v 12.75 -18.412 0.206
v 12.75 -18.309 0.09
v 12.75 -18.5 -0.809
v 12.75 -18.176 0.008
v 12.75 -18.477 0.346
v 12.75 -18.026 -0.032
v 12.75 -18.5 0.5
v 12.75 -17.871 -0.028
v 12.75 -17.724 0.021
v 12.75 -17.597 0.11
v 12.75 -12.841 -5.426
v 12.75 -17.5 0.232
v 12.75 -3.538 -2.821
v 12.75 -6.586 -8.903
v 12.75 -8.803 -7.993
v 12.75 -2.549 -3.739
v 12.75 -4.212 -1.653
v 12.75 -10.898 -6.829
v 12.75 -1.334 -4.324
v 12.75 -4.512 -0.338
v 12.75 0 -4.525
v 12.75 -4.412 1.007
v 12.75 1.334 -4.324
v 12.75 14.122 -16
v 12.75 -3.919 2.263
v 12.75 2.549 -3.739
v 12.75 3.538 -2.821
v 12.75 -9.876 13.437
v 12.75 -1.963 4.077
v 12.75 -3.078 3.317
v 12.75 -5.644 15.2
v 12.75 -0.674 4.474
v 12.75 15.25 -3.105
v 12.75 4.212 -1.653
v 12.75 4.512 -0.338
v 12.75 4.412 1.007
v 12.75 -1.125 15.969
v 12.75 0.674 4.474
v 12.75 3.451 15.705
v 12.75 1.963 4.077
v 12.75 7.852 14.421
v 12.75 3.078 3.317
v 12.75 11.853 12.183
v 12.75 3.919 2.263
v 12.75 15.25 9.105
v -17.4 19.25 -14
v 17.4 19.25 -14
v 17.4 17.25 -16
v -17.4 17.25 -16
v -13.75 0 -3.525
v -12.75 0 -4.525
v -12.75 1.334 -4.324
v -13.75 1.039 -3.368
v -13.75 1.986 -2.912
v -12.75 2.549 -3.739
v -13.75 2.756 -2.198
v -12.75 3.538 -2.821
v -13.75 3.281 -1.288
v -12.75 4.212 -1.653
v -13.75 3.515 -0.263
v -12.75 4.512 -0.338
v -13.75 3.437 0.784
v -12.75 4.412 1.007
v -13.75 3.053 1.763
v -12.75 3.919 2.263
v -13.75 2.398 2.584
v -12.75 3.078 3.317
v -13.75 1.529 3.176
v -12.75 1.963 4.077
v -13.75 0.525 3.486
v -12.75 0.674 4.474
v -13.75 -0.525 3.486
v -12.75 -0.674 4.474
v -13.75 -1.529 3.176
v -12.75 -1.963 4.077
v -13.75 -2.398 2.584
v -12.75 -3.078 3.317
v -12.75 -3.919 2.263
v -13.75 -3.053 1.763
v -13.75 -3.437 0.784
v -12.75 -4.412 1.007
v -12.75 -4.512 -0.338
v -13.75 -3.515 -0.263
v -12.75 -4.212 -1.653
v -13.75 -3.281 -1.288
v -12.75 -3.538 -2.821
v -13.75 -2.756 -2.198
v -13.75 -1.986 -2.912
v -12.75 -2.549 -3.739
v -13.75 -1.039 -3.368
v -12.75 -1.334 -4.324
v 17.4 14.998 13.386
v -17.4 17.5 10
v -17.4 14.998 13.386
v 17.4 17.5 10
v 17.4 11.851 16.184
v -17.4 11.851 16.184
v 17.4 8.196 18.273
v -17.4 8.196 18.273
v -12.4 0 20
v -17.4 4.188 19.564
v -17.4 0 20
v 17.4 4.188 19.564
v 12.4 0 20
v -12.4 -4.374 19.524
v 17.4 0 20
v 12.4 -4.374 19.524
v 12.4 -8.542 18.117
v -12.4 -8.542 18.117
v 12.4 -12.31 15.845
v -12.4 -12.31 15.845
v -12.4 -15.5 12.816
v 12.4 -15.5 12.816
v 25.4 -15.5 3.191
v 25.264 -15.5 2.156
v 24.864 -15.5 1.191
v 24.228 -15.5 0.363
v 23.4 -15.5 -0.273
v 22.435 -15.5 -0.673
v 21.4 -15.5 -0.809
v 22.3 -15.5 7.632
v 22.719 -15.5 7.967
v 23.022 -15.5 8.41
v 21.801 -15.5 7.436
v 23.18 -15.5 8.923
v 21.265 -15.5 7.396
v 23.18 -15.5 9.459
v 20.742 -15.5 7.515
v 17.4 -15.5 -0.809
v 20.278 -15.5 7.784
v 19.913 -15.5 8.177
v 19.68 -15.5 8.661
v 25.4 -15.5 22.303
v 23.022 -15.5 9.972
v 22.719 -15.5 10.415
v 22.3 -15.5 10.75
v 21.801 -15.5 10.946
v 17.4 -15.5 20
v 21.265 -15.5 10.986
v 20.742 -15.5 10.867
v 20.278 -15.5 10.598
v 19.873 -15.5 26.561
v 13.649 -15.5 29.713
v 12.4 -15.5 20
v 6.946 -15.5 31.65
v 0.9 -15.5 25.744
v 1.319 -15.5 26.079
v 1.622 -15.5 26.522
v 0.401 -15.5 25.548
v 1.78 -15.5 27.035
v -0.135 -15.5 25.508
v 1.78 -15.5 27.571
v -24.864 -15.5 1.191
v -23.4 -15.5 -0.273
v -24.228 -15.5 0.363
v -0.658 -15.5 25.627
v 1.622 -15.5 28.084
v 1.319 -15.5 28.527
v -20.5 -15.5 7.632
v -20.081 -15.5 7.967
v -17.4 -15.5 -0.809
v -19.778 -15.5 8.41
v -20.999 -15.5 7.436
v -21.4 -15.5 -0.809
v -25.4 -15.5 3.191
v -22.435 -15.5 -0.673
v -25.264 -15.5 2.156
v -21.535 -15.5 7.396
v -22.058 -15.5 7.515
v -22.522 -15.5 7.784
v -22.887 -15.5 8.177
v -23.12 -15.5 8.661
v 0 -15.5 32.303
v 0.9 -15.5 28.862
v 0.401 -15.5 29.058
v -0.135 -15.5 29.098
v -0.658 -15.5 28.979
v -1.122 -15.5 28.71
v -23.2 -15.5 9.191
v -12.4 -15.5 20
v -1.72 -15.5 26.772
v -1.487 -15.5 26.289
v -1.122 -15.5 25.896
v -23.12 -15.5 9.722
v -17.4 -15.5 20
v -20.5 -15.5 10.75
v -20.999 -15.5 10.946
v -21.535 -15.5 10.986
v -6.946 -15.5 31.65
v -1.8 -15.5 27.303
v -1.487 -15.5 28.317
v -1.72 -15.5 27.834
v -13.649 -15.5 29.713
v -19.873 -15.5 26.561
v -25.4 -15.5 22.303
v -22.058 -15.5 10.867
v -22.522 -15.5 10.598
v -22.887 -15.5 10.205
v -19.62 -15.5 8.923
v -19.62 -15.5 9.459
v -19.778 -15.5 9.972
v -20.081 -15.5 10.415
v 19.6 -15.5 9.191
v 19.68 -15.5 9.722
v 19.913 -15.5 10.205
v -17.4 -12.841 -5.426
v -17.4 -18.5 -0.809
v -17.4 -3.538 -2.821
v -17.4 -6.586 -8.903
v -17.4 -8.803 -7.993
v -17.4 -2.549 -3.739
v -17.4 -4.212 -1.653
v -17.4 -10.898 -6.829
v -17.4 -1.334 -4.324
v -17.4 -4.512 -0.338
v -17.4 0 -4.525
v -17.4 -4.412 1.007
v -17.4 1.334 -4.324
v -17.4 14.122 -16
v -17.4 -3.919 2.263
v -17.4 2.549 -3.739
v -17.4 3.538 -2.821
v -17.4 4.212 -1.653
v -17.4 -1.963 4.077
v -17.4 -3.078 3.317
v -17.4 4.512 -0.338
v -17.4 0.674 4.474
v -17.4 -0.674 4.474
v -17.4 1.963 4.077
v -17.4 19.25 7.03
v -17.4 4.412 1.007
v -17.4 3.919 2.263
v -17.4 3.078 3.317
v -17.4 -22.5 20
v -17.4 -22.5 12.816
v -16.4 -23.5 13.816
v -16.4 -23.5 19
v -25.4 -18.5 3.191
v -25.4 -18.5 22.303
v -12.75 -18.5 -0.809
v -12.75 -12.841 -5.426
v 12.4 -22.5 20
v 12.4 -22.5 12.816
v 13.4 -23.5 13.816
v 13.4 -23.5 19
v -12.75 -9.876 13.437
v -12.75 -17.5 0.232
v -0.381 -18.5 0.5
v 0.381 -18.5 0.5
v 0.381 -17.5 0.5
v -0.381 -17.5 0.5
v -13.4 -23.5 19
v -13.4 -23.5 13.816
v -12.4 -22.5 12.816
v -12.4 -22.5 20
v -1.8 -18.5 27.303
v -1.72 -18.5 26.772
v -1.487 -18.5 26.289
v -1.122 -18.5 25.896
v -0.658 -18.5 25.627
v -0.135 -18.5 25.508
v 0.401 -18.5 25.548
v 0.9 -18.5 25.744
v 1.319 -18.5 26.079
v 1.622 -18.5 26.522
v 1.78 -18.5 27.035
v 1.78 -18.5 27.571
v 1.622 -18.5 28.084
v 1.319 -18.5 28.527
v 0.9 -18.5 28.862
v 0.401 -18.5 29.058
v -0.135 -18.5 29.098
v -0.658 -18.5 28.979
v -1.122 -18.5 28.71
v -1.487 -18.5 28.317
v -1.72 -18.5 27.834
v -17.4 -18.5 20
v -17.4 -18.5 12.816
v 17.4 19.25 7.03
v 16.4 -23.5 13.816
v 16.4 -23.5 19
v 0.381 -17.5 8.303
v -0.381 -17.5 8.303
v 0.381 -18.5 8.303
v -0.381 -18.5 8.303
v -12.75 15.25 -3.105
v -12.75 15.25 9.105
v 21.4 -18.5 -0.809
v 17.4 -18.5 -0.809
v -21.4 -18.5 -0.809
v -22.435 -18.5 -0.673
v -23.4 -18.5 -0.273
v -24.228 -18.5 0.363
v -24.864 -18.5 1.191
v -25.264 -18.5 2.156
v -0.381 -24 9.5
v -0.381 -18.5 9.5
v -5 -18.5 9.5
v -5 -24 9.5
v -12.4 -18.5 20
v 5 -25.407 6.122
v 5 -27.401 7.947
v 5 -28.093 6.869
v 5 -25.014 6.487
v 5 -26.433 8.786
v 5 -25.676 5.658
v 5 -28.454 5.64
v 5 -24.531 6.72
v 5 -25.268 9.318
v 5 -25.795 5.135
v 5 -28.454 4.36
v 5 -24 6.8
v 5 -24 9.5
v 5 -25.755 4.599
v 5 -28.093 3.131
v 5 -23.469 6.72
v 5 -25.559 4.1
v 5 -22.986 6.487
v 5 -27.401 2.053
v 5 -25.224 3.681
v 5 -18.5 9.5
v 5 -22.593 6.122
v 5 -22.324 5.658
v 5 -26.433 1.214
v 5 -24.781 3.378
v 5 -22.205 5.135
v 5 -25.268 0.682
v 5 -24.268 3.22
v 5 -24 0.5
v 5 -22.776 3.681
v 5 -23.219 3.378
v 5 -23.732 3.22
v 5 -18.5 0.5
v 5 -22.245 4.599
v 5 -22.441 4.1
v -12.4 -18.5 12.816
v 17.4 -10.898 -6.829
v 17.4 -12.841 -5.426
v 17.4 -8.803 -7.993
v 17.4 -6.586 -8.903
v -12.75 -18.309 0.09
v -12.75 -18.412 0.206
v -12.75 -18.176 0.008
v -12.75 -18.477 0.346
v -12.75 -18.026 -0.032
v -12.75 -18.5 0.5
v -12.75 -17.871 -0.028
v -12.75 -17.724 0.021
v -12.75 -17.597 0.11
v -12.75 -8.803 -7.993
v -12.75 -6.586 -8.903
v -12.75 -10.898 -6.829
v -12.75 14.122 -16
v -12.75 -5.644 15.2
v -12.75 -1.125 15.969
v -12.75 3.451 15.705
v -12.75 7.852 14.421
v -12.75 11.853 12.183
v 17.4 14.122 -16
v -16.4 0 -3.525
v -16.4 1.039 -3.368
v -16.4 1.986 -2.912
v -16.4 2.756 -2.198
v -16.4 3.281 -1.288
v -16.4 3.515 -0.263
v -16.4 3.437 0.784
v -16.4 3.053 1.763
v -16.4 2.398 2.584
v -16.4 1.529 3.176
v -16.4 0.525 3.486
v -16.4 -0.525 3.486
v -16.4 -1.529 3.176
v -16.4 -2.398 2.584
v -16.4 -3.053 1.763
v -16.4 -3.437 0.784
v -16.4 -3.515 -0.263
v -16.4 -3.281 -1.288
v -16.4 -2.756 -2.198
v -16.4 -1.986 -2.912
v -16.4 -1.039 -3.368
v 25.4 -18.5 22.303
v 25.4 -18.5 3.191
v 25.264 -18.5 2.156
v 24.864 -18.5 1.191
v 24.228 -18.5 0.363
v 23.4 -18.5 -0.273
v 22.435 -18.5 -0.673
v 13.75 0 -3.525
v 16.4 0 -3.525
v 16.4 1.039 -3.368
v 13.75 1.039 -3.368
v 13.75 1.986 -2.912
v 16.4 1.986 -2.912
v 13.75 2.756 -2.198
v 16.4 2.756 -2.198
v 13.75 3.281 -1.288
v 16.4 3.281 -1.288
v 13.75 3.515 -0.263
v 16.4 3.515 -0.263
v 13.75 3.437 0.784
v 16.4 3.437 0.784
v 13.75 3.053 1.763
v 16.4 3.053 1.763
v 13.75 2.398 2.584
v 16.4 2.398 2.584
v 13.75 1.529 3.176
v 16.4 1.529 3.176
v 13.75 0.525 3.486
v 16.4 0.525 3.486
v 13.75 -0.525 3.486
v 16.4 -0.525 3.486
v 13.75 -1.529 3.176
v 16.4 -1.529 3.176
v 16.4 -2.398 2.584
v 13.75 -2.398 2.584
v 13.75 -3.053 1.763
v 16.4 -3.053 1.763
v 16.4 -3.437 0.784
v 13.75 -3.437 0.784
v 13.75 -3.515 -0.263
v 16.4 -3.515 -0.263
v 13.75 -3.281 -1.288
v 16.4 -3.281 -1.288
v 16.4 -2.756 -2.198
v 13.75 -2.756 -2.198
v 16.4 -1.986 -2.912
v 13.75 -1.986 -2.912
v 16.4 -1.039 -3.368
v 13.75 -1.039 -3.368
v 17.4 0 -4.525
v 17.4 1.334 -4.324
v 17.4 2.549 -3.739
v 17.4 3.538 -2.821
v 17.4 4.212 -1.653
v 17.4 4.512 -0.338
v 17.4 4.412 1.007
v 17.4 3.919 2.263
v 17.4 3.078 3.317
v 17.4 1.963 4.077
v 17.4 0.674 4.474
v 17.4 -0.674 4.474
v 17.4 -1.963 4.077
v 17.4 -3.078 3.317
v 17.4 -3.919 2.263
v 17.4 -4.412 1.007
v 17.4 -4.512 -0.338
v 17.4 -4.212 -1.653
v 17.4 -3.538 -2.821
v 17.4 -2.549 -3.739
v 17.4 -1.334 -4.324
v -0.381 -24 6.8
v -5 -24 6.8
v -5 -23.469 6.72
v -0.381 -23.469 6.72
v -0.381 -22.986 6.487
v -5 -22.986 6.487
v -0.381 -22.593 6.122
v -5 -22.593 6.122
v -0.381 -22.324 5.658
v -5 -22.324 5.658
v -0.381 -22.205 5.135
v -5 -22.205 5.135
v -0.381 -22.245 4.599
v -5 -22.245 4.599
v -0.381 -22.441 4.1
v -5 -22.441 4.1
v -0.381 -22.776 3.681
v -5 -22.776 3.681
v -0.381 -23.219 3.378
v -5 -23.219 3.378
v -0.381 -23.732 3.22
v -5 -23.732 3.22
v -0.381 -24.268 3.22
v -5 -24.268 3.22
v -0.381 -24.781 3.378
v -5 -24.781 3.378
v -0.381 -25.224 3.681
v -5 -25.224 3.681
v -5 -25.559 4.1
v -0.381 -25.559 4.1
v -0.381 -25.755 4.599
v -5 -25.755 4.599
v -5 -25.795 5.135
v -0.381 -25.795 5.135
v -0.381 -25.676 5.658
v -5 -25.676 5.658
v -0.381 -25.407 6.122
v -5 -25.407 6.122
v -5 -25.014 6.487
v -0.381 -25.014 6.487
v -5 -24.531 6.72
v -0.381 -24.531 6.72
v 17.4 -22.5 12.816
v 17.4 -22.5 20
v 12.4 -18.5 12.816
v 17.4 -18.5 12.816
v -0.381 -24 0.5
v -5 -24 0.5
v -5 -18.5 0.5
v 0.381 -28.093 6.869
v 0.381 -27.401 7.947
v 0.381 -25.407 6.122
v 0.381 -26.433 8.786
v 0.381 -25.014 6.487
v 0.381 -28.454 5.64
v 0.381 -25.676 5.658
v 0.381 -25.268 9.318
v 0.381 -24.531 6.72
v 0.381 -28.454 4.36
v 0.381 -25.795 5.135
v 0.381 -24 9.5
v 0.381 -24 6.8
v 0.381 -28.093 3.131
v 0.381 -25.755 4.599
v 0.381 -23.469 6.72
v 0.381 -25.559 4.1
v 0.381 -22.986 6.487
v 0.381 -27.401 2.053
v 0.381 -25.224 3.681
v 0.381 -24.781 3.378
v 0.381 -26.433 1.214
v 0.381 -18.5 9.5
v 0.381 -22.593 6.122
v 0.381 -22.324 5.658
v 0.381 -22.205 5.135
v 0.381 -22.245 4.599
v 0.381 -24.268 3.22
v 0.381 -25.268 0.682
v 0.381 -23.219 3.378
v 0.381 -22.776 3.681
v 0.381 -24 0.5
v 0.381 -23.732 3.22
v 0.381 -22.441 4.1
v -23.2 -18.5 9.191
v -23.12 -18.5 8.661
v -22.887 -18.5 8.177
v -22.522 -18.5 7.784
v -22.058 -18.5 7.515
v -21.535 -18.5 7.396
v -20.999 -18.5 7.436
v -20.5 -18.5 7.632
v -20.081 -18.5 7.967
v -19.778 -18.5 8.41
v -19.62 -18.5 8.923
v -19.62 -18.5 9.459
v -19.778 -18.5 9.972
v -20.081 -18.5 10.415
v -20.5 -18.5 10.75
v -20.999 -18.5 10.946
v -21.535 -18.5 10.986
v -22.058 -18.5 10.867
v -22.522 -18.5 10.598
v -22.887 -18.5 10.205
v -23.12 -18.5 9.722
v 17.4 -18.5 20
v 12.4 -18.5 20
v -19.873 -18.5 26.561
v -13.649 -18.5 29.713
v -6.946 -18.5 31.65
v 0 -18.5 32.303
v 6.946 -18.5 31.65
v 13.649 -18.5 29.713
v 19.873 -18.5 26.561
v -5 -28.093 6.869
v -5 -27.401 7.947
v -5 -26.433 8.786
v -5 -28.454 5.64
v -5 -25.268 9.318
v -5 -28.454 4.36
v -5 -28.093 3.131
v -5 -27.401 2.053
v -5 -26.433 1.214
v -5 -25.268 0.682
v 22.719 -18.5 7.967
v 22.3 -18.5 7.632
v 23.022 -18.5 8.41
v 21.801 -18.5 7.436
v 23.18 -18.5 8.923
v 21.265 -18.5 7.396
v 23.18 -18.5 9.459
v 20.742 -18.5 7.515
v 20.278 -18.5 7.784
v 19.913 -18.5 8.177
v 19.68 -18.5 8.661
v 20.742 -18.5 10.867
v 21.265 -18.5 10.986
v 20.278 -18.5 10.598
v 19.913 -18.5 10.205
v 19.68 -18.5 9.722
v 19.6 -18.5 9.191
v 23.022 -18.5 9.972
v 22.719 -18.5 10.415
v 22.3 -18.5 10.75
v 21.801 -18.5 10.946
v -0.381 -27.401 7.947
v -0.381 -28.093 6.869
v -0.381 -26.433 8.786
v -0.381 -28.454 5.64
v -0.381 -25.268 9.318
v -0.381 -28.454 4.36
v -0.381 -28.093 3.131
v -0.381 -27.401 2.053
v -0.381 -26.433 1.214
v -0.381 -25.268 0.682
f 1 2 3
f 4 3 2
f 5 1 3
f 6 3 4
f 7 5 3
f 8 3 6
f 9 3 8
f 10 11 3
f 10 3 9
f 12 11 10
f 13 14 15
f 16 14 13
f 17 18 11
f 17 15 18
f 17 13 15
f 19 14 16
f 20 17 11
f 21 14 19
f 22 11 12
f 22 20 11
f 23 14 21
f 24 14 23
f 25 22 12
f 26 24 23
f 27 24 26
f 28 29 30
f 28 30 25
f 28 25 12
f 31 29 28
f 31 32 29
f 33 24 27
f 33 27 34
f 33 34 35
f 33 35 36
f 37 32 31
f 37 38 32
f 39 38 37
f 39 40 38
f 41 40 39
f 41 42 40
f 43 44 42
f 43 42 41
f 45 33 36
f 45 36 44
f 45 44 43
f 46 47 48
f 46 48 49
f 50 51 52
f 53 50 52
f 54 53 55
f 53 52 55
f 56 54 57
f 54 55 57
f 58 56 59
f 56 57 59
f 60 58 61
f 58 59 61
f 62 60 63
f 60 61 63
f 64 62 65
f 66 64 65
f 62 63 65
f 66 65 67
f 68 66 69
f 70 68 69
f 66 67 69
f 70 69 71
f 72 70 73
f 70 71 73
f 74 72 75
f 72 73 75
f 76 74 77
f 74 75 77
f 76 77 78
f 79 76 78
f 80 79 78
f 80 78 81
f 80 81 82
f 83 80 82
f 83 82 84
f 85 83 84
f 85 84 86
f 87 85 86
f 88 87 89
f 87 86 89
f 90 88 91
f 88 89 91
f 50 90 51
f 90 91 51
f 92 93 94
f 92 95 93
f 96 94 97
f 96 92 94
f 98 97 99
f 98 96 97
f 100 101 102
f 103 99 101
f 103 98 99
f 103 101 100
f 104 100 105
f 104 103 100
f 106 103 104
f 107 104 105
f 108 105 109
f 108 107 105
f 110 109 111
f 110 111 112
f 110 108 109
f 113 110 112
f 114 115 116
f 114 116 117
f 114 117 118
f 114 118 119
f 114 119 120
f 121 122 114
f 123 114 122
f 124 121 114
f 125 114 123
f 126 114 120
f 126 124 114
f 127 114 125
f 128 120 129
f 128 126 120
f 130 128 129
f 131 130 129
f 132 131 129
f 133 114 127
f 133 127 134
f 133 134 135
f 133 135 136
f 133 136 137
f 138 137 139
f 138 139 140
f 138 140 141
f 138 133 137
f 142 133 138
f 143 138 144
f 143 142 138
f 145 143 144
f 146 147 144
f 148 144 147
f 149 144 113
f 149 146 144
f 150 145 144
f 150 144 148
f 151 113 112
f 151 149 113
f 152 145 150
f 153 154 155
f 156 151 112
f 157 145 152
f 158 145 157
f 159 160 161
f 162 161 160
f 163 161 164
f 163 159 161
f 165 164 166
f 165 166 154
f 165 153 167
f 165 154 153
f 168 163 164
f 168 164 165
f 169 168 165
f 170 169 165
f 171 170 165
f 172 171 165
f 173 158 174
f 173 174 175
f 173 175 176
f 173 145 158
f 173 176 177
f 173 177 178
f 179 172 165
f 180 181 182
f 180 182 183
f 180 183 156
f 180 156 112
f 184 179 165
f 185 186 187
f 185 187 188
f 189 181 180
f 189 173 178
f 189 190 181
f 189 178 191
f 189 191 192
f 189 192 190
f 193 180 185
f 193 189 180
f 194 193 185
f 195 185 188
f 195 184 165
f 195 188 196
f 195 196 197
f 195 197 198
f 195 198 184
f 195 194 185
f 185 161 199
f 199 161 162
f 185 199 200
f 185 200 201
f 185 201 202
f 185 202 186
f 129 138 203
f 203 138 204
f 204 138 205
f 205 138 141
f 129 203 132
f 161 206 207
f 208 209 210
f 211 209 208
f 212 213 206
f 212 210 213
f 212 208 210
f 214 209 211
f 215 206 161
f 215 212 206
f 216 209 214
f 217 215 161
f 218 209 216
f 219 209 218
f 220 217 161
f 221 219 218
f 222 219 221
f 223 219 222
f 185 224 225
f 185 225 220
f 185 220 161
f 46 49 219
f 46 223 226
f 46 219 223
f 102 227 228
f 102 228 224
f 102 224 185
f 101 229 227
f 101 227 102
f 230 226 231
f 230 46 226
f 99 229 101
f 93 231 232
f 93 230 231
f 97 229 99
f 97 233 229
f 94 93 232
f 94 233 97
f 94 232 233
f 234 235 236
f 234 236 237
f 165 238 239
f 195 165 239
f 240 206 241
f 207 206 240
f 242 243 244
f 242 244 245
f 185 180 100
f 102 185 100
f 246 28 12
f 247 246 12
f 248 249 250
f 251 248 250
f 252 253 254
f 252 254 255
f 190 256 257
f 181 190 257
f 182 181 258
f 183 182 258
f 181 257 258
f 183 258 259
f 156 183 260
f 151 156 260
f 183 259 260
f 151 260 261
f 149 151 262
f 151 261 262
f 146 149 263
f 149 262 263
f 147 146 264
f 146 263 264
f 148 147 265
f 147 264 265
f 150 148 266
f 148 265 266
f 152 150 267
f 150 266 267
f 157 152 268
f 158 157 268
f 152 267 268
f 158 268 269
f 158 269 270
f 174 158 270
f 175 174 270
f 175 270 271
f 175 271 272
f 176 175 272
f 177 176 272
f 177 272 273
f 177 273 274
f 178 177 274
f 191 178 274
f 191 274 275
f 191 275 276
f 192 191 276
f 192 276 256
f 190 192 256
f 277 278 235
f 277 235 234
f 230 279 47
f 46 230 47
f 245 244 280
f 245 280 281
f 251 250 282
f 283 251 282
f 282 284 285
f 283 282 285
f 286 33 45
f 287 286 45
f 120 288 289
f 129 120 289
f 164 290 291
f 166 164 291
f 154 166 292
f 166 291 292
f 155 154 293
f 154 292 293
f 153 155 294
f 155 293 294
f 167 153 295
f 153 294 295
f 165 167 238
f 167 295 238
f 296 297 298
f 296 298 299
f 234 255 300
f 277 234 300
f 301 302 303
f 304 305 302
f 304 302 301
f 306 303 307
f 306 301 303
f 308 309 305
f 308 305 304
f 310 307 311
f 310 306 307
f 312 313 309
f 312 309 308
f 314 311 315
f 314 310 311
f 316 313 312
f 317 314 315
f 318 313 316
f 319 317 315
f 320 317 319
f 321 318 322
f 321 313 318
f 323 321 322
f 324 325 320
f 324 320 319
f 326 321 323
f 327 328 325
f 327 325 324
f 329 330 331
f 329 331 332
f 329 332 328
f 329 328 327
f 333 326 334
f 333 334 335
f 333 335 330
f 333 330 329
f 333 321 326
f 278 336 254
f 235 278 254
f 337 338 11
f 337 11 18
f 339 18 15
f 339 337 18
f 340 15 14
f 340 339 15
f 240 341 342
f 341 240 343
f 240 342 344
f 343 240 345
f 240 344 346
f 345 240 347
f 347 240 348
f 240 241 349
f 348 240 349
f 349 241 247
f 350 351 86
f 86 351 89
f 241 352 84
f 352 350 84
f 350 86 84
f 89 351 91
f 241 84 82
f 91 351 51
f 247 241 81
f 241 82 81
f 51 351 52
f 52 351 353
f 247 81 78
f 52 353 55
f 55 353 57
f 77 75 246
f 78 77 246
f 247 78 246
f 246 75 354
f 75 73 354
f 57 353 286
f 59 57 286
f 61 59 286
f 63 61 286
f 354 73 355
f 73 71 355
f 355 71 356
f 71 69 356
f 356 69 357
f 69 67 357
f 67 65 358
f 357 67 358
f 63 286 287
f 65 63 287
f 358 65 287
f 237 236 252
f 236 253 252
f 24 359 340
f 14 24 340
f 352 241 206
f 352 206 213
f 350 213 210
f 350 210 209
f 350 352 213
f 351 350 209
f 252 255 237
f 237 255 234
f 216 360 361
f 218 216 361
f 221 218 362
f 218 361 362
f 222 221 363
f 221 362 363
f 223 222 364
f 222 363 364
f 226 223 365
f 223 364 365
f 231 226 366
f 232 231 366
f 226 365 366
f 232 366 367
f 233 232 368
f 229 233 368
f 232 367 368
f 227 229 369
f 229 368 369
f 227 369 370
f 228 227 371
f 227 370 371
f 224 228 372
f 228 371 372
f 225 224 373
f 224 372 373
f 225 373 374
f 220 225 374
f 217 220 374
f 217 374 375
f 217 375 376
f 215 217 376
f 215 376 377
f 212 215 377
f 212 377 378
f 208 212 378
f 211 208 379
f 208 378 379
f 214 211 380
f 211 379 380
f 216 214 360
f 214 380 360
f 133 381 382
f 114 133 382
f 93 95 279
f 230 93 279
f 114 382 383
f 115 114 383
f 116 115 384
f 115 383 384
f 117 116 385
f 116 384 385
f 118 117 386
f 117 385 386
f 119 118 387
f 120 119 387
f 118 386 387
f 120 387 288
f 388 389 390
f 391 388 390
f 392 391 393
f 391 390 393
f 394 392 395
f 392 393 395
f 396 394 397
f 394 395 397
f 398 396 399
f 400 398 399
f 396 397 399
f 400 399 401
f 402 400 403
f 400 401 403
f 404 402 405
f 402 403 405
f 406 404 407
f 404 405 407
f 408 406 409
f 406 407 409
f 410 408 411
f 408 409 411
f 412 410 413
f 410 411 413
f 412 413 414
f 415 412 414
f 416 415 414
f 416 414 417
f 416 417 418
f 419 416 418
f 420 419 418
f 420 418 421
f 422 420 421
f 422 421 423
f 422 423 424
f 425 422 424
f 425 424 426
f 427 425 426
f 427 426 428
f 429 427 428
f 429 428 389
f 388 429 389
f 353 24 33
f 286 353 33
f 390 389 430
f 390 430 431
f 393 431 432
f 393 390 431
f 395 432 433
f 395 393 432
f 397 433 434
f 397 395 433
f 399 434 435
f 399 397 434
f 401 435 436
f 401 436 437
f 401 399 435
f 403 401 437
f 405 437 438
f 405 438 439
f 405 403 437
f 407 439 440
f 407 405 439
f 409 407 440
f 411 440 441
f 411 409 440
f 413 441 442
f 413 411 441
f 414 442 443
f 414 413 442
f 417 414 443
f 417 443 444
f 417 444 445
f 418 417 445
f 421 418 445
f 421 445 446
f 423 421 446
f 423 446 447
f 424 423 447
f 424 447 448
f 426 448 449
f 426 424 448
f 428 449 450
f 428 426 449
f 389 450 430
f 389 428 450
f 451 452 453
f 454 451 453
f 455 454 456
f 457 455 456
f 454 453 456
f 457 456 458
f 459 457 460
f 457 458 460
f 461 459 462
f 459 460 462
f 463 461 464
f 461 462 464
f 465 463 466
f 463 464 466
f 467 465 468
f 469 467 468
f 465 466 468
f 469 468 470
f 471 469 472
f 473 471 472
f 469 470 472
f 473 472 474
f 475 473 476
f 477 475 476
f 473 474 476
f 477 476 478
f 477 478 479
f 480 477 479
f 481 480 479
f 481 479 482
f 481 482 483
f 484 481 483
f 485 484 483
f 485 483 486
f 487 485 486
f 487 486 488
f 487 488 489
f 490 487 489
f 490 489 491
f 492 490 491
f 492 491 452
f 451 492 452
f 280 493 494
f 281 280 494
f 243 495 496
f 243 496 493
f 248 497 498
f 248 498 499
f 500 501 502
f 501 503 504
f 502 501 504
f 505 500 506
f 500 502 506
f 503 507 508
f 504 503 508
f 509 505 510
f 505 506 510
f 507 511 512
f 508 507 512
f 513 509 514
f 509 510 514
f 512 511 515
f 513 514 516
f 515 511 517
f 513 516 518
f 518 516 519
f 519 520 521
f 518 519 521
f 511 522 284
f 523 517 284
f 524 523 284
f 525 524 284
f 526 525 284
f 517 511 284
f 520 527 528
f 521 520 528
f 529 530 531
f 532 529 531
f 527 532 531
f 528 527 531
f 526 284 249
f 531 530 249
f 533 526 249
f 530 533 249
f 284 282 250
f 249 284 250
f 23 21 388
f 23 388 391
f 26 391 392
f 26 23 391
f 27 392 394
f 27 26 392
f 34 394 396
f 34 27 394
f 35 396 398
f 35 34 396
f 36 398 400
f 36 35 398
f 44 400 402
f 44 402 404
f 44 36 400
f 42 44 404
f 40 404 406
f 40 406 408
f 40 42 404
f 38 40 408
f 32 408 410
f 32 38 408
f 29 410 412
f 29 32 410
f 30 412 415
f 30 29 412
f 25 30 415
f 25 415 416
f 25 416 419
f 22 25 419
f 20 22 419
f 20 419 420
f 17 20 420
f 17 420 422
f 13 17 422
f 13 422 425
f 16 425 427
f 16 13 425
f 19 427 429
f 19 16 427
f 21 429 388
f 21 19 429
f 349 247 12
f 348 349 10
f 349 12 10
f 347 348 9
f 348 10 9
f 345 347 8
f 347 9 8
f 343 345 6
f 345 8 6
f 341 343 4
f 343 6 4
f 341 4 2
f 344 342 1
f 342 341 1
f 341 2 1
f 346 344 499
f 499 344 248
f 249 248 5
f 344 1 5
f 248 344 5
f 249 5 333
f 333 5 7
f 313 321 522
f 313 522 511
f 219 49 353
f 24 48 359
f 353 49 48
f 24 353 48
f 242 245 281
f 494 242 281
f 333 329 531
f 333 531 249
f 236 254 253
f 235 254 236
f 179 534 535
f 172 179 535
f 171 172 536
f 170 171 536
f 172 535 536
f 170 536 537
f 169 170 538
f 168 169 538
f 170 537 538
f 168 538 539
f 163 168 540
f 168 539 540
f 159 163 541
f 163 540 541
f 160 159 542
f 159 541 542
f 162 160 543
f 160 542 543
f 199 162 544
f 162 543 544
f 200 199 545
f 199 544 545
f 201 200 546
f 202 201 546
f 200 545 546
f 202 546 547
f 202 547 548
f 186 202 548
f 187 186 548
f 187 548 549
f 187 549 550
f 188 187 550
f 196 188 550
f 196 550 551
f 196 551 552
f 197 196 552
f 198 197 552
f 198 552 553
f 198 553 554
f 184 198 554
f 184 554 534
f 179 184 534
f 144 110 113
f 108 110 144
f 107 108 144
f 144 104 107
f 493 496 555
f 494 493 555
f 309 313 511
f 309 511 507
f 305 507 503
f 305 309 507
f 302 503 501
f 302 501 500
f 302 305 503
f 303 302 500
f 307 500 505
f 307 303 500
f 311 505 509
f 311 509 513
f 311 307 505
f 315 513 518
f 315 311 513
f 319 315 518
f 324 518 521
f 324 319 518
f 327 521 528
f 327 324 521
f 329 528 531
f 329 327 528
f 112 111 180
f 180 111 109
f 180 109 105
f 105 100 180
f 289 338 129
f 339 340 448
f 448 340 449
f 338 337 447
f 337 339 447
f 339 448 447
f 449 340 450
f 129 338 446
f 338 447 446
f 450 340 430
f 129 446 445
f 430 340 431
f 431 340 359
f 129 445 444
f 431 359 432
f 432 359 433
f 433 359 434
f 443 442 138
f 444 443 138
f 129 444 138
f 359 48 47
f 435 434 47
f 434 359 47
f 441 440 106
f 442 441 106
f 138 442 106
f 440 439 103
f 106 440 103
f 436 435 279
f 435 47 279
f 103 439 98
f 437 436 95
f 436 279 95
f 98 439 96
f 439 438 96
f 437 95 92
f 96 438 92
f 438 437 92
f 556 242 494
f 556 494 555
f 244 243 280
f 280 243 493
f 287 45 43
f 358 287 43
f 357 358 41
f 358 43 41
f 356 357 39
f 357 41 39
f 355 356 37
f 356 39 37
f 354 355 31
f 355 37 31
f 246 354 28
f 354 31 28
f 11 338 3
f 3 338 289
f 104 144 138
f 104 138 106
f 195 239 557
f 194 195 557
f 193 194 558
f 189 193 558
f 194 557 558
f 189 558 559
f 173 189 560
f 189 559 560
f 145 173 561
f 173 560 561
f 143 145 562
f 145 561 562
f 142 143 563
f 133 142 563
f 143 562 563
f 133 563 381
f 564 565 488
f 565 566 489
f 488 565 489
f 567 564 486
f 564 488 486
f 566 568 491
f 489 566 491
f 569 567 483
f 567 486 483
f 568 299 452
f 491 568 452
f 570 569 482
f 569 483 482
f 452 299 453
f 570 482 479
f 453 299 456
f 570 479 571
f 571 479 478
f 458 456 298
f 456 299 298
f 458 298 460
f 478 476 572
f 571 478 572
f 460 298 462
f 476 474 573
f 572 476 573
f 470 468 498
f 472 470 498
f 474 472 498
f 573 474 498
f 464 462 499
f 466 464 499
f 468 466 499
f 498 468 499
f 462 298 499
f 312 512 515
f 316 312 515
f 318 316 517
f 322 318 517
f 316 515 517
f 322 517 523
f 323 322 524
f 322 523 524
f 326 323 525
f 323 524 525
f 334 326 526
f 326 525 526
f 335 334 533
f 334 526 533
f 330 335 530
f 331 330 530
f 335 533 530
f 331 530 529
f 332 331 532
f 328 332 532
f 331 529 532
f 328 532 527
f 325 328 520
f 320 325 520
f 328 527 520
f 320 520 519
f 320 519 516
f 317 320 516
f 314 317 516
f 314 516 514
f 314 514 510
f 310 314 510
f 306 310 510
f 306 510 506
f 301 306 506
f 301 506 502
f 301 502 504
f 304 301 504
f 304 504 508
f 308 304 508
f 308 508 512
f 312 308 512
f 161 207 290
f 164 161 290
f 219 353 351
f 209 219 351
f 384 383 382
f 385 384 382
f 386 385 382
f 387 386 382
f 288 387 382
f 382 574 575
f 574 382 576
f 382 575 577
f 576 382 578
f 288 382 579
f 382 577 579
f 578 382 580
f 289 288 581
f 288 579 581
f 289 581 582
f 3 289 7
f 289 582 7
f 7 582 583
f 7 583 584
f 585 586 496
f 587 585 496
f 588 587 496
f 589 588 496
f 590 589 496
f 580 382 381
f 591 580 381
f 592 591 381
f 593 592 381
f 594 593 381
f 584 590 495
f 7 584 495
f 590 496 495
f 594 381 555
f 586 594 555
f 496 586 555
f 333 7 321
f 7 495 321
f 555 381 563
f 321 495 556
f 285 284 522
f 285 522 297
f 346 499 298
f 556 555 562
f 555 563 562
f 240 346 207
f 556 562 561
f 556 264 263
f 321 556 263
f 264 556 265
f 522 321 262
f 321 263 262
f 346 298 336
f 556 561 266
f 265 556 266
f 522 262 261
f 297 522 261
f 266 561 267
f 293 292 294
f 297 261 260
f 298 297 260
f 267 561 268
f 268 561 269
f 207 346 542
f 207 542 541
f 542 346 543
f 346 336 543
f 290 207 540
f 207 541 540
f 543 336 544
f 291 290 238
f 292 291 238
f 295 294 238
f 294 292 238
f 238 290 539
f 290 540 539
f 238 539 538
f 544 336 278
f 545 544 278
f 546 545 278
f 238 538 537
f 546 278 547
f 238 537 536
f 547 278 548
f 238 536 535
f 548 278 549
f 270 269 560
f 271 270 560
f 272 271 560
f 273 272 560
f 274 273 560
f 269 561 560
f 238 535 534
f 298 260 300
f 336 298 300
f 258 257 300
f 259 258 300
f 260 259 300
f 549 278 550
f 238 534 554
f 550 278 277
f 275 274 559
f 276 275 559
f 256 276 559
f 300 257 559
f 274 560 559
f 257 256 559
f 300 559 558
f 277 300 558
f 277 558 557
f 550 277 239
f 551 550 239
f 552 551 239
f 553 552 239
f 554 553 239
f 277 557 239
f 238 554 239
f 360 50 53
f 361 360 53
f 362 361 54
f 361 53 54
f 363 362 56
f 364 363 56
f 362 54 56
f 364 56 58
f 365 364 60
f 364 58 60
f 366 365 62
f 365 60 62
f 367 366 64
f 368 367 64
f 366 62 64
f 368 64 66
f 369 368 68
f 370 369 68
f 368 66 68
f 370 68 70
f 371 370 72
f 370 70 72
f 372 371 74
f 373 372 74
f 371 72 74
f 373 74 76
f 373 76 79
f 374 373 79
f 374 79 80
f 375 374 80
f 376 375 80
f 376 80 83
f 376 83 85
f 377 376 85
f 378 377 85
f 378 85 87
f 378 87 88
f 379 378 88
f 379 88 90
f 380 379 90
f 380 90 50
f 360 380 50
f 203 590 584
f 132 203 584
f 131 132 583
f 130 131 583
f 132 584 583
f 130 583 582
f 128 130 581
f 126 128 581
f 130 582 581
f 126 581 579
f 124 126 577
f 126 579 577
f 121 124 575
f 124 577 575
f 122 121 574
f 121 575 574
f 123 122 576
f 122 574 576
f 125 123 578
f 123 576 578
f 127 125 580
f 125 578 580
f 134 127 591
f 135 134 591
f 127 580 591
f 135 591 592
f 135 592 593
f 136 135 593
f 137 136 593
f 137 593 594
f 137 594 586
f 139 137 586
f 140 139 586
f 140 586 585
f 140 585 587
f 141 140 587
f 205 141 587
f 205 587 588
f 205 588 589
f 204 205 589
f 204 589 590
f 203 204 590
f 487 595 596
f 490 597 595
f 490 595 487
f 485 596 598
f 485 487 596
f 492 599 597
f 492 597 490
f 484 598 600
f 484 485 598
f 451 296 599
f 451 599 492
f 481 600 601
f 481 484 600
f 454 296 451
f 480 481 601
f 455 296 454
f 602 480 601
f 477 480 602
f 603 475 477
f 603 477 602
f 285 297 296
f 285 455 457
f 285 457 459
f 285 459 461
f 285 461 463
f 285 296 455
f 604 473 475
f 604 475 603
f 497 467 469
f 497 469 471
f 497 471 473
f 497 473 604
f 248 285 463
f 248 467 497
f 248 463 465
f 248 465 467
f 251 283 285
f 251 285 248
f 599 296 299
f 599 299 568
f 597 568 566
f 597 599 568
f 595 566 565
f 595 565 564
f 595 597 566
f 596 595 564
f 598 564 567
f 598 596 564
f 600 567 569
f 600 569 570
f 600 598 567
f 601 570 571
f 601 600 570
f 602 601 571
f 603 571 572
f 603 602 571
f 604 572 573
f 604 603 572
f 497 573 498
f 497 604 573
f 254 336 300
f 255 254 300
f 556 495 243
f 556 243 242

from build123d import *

# Parameters (mm, degrees)
BOSS_EXTRUDE1_DEPTH            = 17.4
CUT_EXTRUDE1_DEPTH             = 12.75
BOSS_EXTRUDE2_DEPTH            = 5
BOSS_EXTRUDE3_REACH            = 51.227
BOSS_EXTRUDE4_DEPTH            = 4.65
BOSS_EXTRUDE5_DEPTH            = 4.65
BOSS_EXTRUDE6_REACH            = 51.227
BOSS_EXTRUDE7_DEPTH            = 4.65
BOSS_EXTRUDE8_START            = -4.65
BOSS_EXTRUDE8_DEPTH            = 4.65
CHAMFER2_SIZE                  = 2
SKETCH10_R                     = 3.525
CUT_EXTRUDE2_DEPTH             = 50.226923528
CUT_EXTRUDE3_DEPTH             = 0.381
BOSS_EXTRUDE9_DEPTH            = 3
BOSS_EXTRUDE10_START           = -5
BOSS_EXTRUDE10_DEPTH           = 5
M3_CLEARANCE_HOLE1_D           = 3.6
M3_CLEARANCE_HOLE2_D           = 3.6
CHAMFER5_SIZE                  = 1
CUT_EXTRUDE4_REACH             = 52.009
CUT_EXTRUDE4_DIRECTION_2_REACH = 52.009
CHAMFER6_SIZE                  = 1


with BuildPart() as part:
    # Sketch1 → Boss-Extrude1 (new, symmetric)
    with BuildSketch(Plane(origin=(0, 0, 0), x_dir=(0, 0, -1), z_dir=(1, 0, 0))):
        with BuildLine():
            Line((0, 17.5), (-10, 17.5))
            ThreePointArc((-10, 17.5), (-20, 0), (-10, -17.5))
            Line((-10, -17.5), (0, -17.5))
            ThreePointArc((0, -17.5), (10, 0), (0, 17.5))
        make_face()
    extrude(amount=BOSS_EXTRUDE1_DEPTH, both=True)

    # Sketch2 → Cut-Extrude1 (cut, symmetric)
    with BuildSketch(Plane(origin=(0, 0, 0), x_dir=(0, 0, -1), z_dir=(1, 0, 0))):
        with BuildLine():
            Line((-6, -17.5), (0, -17.5))
            ThreePointArc((0, -17.5), (10, 0), (0, 17.5))
            Line((0, 17.5), (-6, 17.5))
            ThreePointArc((-6, 17.5), (-16, 0), (-6, -17.5))
        make_face()
    extrude(amount=CUT_EXTRUDE1_DEPTH, both=True, mode=Mode.SUBTRACT)

    # Sketch3 → Boss-Extrude2 (add, symmetric)
    with BuildSketch(Plane(origin=(0, 0, 0), x_dir=(0, 0, -1), z_dir=(1, 0, 0))):
        with BuildLine():
            Line((-9.5, -17.5), (-9.5, -24))
            ThreePointArc((-9.5, -24), (-5, -28.5), (-0.5, -24))
            Line((-0.5, -24), (-0.5, -17.5))
            Line((-0.5, -17.5), (-9.5, -17.5))
        make_face()
    extrude(amount=BOSS_EXTRUDE2_DEPTH, both=True)

    # Boss-Extrude3: up to this face of the body (flat: up to its plane)
    boss_extrude3_end = Plane(part.part.faces().sort_by_distance((-17.4, 0, 5))[0])
    # Sketch4 → Boss-Extrude3 (add, up to the picked face)
    with BuildSketch(Plane(origin=(17.4, 0, 0), x_dir=(0, 0, -1), z_dir=(1, 0, 0)), mode=Mode.PRIVATE) as boss_extrude3_sk1:
        with BuildLine():
            Line((-13.437411512, -9.876147912), (0.981589269, -18.200961894))
            Line((0.981589269, -18.200961894), (0.808939539, -18.5))
            Line((0.808939539, -18.5), (-8.303030303, -18.5))
            Line((-8.303030303, -18.5), (-10, -17.5))
            ThreePointArc((-10, -17.5), (-14.227290753, -14.184221555), (-17.437411512, -9.876147912))
            Line((-17.437411512, -9.876147912), (-13.437411512, -9.876147912))
        make_face()
    boss_extrude3_tool1 = split(extrude(boss_extrude3_sk1.sketch, amount=-BOSS_EXTRUDE3_REACH, mode=Mode.PRIVATE), bisect_by=boss_extrude3_end, keep=Keep.BOTH, mode=Mode.PRIVATE)
    add(boss_extrude3_tool1.solids().sort_by(Axis((17.4, -14.739023, 9.130288), (-1, 0, 0)))[0])

    # Sketch5 → Boss-Extrude4 (add)
    with BuildSketch(Plane(origin=(17.4, 0, 0), x_dir=(0, 0, -1), z_dir=(1, 0, 0))):
        Polygon((5.425994541, -12.841240042), (0.808939539, -18.5), (-1.191060461, -18.5), (-1.191060461, -17.5), align=None)
    extrude(amount=-BOSS_EXTRUDE4_DEPTH)

    # Sketch6 → Boss-Extrude5 (add)
    with BuildSketch(Plane.ZY.offset(17.4)):
        Polygon((-5.425994541, -12.841240042), (-0.808939539, -18.5), (1.191060461, -18.5), (1.191060461, -17.5), align=None)
    extrude(amount=-BOSS_EXTRUDE5_DEPTH)

    # Boss-Extrude6: up to this face of the body (flat: up to its plane)
    boss_extrude6_end = Plane(part.part.faces().sort_by_distance((-17.4, -0.260518526, 4.968984896))[0])
    # Sketch7 → Boss-Extrude6 (add, up to the picked face)
    with BuildSketch(Plane(origin=(17.4, 0, 0), x_dir=(0, 0, -1), z_dir=(1, 0, 0)), mode=Mode.PRIVATE) as boss_extrude6_sk1:
        with BuildLine():
            Line((-10, 17.5), (-7.03030303, 19.25))
            Line((-7.03030303, 19.25), (16, 19.25))
            Line((16, 19.25), (16, 14.121852756))
            Line((16, 14.121852756), (3.105217997, 15.25))
            Line((3.105217997, 15.25), (-13.105217997, 15.25))
            ThreePointArc((-13.105217997, 15.25), (-11.605823563, 16.448441254), (-10, 17.5))
        make_face()
    boss_extrude6_tool1 = split(extrude(boss_extrude6_sk1.sketch, amount=-BOSS_EXTRUDE6_REACH, mode=Mode.PRIVATE), bisect_by=boss_extrude6_end, keep=Keep.BOTH, mode=Mode.PRIVATE)
    add(boss_extrude6_tool1.solids().sort_by(Axis((17.4, 17.022897, -3.374472), (-1, 0, 0)))[0])

    # Sketch8 → Boss-Extrude7 (add)
    with BuildSketch(Plane(origin=(17.4, 0, 0), x_dir=(0, 0, -1), z_dir=(1, 0, 0))):
        with BuildLine():
            Line((16, 14.121852756), (8.902736416, -6.585768423))
            ThreePointArc((8.902736416, -6.585768423), (9.319810717, 5.212488097), (3.105217997, 15.25))
            Line((3.105217997, 15.25), (16, 14.121852756))
        make_face()
    extrude(amount=-BOSS_EXTRUDE7_DEPTH)

    # Sketch9 → Boss-Extrude8 (add)
    with BuildSketch(Plane.ZY.offset(17.4).offset(BOSS_EXTRUDE8_START)):
        with BuildLine():
            Line((-16, 14.121852756), (-8.902736416, -6.585768423))
            ThreePointArc((-8.902736416, -6.585768423), (-9.319810717, 5.212488097), (-3.105217997, 15.25))
            Line((-3.105217997, 15.25), (-16, 14.121852756))
        make_face()
    extrude(amount=BOSS_EXTRUDE8_DEPTH)

    # Chamfer2
    chamfer2_edges = [part.edges().sort_by_distance(p)[0] for p in [
        (0, 19.25, -16),
    ]]
    chamfer(chamfer2_edges, length=CHAMFER2_SIZE)

    # Sketch10 → Cut-Extrude2 (cut, through all)
    with BuildSketch(Plane(origin=(17.4, 0, 0), x_dir=(0, 0, -1), z_dir=(1, 0, 0))):
        Circle(SKETCH10_R)
    extrude(amount=-CUT_EXTRUDE2_DEPTH, mode=Mode.SUBTRACT)

    # Sketch11 → Cut-Extrude3 (cut, symmetric)
    with BuildSketch(Plane(origin=(0, 0, 0), x_dir=(0, 0, -1), z_dir=(1, 0, 0))):
        with BuildLine():
            Line((-9.5, -17.5), (-9.5, -24))
            ThreePointArc((-9.5, -24), (-5, -28.5), (-0.5, -24))
            Line((-0.5, -24), (-0.5, -17.5))
            Line((-0.5, -17.5), (-9.5, -17.5))
        make_face()
    extrude(amount=CUT_EXTRUDE3_DEPTH, both=True, mode=Mode.SUBTRACT)

    # Sketch12 → Boss-Extrude9 (add)
    with BuildSketch(Plane.XZ.offset(18.5)):
        with BuildLine():
            Line((-17.4, -0.808939539), (-21.4, -0.808939539))
            ThreePointArc((-21.4, -0.808939539), (-24.228427125, 0.362633337), (-25.4, 3.191060461))
            Line((-25.4, 3.191060461), (-25.4, 22.303030303))
            ThreePointArc((-25.4, 22.303030303), (0, 32.303030303), (25.4, 22.303030303))
            Line((25.4, 22.303030303), (25.4, 3.191060461))
            ThreePointArc((25.4, 3.191060461), (24.228427125, 0.362633337), (21.4, -0.808939539))
            Line((21.4, -0.808939539), (17.4, -0.808939539))
            Line((17.4, -0.808939539), (17.4, 8.303030303))
            Line((17.4, 8.303030303), (-17.4, 8.303030303))
            Line((-17.4, 8.303030303), (-17.4, -0.808939539))
        make_face()
    extrude(amount=-BOSS_EXTRUDE9_DEPTH)

    # Sketch13 → Boss-Extrude10 (add)
    with BuildSketch(Plane.ZY.offset(17.4).offset(BOSS_EXTRUDE10_START)):
        with BuildLine():
            Line((20, -15.5), (20, 0))
            ThreePointArc((20, 0), (18.116589611, -8.542032098), (12.815624628, -15.5))
            Line((12.815624628, -15.5), (12.815624628, -23.5))
            Line((12.815624628, -23.5), (20, -23.5))
            Line((20, -23.5), (20, -15.5))
        make_face()
    boss_extrude10 = extrude(amount=BOSS_EXTRUDE10_DEPTH)

    # Mirror1: Boss-Extrude10 across plane
    add(boss_extrude10.mirror(Plane(origin=(0, 0, 0), x_dir=(0, 0, 1), z_dir=(1, 0, 0))))

    # M3 Clearance Hole1 (through all)
    with Locations(Plane(origin=(0, -15.5, 0), x_dir=(1, 0, 0), z_dir=(0, 1, 0))):
        with Locations((0, -27.303030303), (-21.4, -9.191060461), (21.4, -9.191060461)):
            Hole(M3_CLEARANCE_HOLE1_D / 2)

    # M3 Clearance Hole2 (through all)
    with Locations(Plane(origin=(5, 0, 0), x_dir=(0, 0, -1), z_dir=(1, 0, 0))):
        with Locations((-5, -24)):
            Hole(M3_CLEARANCE_HOLE2_D / 2)

    # Chamfer5
    chamfer5_edges = [part.edges().sort_by_distance(p)[0] for p in [
        (12.75, 0, 3.525),
        (-12.75, 0, 3.525),
        (-17.4, 0, 3.525),
        (17.4, 0, 3.525),
    ]]
    chamfer(chamfer5_edges, length=CHAMFER5_SIZE)

    # Cut-Extrude4: up to this face of the body (flat: up to its plane)
    cut_extrude4_end = Plane(part.part.faces().sort_by_distance((-12.75, 0, 4.990087357))[0])
    # Sketch18 → Cut-Extrude4 (cut, up to the picked face)
    with BuildSketch(Plane(origin=(0, 0, 0), x_dir=(0, 0, -1), z_dir=(1, 0, 0)), mode=Mode.PRIVATE) as cut_extrude4_sk1:
        with BuildLine():
            Line((-0.5, -18.5), (1.499538462, -18.5))
            Line((1.499538462, -18.5), (-0.232112642, -17.500230769))
            ThreePointArc((-0.232112642, -17.500230769), (0.017518635, -18.102893984), (-0.5, -18.5))
        make_face()
    cut_extrude4_tool1 = split(extrude(cut_extrude4_sk1.sketch, amount=-CUT_EXTRUDE4_REACH, mode=Mode.PRIVATE), bisect_by=cut_extrude4_end, keep=Keep.BOTH, mode=Mode.PRIVATE)
    add(cut_extrude4_tool1.solids().sort_by(Axis((0, -18.22087, -0.457813), (-1, 0, 0)))[0], mode=Mode.SUBTRACT)

    # Cut-Extrude4 direction 2: up to this face of the body (flat: up to its plane)
    cut_extrude4_direction_2_end = Plane(part.part.faces().sort_by_distance((12.75, 0, 4.990087357))[0])
    # Sketch18 → Cut-Extrude4 direction 2 (cut, up to the picked face)
    with BuildSketch(Plane(origin=(0, 0, 0), x_dir=(0, 0, -1), z_dir=(1, 0, 0)), mode=Mode.PRIVATE) as cut_extrude4_direction_2_sk1:
        with BuildLine():
            Line((-0.5, -18.5), (1.499538462, -18.5))
            Line((1.499538462, -18.5), (-0.232112642, -17.500230769))
            ThreePointArc((-0.232112642, -17.500230769), (0.017518635, -18.102893984), (-0.5, -18.5))
        make_face()
    cut_extrude4_direction_2_tool1 = split(extrude(cut_extrude4_direction_2_sk1.sketch, amount=CUT_EXTRUDE4_DIRECTION_2_REACH, mode=Mode.PRIVATE), bisect_by=cut_extrude4_direction_2_end, keep=Keep.BOTH, mode=Mode.PRIVATE)
    add(cut_extrude4_direction_2_tool1.solids().sort_by(Axis((0, -18.22087, -0.457813), (1, 0, 0)))[0], mode=Mode.SUBTRACT)

    # Chamfer6
    chamfer6_edges = [part.edges().sort_by_distance(p)[0] for p in [
        (-17.4, -23.5, 16.407812314),
        (-12.4, -23.5, 16.407812314),
        (-14.9, -23.5, 20),
        (-14.9, -23.5, 12.815624628),
        (14.9, -23.5, 20),
        (12.4, -23.5, 16.407812314),
        (17.4, -23.5, 16.407812314),
        (14.9, -23.5, 12.815624628),
    ]]
    chamfer(chamfer6_edges, length=CHAMFER6_SIZE)


solid = part.part
